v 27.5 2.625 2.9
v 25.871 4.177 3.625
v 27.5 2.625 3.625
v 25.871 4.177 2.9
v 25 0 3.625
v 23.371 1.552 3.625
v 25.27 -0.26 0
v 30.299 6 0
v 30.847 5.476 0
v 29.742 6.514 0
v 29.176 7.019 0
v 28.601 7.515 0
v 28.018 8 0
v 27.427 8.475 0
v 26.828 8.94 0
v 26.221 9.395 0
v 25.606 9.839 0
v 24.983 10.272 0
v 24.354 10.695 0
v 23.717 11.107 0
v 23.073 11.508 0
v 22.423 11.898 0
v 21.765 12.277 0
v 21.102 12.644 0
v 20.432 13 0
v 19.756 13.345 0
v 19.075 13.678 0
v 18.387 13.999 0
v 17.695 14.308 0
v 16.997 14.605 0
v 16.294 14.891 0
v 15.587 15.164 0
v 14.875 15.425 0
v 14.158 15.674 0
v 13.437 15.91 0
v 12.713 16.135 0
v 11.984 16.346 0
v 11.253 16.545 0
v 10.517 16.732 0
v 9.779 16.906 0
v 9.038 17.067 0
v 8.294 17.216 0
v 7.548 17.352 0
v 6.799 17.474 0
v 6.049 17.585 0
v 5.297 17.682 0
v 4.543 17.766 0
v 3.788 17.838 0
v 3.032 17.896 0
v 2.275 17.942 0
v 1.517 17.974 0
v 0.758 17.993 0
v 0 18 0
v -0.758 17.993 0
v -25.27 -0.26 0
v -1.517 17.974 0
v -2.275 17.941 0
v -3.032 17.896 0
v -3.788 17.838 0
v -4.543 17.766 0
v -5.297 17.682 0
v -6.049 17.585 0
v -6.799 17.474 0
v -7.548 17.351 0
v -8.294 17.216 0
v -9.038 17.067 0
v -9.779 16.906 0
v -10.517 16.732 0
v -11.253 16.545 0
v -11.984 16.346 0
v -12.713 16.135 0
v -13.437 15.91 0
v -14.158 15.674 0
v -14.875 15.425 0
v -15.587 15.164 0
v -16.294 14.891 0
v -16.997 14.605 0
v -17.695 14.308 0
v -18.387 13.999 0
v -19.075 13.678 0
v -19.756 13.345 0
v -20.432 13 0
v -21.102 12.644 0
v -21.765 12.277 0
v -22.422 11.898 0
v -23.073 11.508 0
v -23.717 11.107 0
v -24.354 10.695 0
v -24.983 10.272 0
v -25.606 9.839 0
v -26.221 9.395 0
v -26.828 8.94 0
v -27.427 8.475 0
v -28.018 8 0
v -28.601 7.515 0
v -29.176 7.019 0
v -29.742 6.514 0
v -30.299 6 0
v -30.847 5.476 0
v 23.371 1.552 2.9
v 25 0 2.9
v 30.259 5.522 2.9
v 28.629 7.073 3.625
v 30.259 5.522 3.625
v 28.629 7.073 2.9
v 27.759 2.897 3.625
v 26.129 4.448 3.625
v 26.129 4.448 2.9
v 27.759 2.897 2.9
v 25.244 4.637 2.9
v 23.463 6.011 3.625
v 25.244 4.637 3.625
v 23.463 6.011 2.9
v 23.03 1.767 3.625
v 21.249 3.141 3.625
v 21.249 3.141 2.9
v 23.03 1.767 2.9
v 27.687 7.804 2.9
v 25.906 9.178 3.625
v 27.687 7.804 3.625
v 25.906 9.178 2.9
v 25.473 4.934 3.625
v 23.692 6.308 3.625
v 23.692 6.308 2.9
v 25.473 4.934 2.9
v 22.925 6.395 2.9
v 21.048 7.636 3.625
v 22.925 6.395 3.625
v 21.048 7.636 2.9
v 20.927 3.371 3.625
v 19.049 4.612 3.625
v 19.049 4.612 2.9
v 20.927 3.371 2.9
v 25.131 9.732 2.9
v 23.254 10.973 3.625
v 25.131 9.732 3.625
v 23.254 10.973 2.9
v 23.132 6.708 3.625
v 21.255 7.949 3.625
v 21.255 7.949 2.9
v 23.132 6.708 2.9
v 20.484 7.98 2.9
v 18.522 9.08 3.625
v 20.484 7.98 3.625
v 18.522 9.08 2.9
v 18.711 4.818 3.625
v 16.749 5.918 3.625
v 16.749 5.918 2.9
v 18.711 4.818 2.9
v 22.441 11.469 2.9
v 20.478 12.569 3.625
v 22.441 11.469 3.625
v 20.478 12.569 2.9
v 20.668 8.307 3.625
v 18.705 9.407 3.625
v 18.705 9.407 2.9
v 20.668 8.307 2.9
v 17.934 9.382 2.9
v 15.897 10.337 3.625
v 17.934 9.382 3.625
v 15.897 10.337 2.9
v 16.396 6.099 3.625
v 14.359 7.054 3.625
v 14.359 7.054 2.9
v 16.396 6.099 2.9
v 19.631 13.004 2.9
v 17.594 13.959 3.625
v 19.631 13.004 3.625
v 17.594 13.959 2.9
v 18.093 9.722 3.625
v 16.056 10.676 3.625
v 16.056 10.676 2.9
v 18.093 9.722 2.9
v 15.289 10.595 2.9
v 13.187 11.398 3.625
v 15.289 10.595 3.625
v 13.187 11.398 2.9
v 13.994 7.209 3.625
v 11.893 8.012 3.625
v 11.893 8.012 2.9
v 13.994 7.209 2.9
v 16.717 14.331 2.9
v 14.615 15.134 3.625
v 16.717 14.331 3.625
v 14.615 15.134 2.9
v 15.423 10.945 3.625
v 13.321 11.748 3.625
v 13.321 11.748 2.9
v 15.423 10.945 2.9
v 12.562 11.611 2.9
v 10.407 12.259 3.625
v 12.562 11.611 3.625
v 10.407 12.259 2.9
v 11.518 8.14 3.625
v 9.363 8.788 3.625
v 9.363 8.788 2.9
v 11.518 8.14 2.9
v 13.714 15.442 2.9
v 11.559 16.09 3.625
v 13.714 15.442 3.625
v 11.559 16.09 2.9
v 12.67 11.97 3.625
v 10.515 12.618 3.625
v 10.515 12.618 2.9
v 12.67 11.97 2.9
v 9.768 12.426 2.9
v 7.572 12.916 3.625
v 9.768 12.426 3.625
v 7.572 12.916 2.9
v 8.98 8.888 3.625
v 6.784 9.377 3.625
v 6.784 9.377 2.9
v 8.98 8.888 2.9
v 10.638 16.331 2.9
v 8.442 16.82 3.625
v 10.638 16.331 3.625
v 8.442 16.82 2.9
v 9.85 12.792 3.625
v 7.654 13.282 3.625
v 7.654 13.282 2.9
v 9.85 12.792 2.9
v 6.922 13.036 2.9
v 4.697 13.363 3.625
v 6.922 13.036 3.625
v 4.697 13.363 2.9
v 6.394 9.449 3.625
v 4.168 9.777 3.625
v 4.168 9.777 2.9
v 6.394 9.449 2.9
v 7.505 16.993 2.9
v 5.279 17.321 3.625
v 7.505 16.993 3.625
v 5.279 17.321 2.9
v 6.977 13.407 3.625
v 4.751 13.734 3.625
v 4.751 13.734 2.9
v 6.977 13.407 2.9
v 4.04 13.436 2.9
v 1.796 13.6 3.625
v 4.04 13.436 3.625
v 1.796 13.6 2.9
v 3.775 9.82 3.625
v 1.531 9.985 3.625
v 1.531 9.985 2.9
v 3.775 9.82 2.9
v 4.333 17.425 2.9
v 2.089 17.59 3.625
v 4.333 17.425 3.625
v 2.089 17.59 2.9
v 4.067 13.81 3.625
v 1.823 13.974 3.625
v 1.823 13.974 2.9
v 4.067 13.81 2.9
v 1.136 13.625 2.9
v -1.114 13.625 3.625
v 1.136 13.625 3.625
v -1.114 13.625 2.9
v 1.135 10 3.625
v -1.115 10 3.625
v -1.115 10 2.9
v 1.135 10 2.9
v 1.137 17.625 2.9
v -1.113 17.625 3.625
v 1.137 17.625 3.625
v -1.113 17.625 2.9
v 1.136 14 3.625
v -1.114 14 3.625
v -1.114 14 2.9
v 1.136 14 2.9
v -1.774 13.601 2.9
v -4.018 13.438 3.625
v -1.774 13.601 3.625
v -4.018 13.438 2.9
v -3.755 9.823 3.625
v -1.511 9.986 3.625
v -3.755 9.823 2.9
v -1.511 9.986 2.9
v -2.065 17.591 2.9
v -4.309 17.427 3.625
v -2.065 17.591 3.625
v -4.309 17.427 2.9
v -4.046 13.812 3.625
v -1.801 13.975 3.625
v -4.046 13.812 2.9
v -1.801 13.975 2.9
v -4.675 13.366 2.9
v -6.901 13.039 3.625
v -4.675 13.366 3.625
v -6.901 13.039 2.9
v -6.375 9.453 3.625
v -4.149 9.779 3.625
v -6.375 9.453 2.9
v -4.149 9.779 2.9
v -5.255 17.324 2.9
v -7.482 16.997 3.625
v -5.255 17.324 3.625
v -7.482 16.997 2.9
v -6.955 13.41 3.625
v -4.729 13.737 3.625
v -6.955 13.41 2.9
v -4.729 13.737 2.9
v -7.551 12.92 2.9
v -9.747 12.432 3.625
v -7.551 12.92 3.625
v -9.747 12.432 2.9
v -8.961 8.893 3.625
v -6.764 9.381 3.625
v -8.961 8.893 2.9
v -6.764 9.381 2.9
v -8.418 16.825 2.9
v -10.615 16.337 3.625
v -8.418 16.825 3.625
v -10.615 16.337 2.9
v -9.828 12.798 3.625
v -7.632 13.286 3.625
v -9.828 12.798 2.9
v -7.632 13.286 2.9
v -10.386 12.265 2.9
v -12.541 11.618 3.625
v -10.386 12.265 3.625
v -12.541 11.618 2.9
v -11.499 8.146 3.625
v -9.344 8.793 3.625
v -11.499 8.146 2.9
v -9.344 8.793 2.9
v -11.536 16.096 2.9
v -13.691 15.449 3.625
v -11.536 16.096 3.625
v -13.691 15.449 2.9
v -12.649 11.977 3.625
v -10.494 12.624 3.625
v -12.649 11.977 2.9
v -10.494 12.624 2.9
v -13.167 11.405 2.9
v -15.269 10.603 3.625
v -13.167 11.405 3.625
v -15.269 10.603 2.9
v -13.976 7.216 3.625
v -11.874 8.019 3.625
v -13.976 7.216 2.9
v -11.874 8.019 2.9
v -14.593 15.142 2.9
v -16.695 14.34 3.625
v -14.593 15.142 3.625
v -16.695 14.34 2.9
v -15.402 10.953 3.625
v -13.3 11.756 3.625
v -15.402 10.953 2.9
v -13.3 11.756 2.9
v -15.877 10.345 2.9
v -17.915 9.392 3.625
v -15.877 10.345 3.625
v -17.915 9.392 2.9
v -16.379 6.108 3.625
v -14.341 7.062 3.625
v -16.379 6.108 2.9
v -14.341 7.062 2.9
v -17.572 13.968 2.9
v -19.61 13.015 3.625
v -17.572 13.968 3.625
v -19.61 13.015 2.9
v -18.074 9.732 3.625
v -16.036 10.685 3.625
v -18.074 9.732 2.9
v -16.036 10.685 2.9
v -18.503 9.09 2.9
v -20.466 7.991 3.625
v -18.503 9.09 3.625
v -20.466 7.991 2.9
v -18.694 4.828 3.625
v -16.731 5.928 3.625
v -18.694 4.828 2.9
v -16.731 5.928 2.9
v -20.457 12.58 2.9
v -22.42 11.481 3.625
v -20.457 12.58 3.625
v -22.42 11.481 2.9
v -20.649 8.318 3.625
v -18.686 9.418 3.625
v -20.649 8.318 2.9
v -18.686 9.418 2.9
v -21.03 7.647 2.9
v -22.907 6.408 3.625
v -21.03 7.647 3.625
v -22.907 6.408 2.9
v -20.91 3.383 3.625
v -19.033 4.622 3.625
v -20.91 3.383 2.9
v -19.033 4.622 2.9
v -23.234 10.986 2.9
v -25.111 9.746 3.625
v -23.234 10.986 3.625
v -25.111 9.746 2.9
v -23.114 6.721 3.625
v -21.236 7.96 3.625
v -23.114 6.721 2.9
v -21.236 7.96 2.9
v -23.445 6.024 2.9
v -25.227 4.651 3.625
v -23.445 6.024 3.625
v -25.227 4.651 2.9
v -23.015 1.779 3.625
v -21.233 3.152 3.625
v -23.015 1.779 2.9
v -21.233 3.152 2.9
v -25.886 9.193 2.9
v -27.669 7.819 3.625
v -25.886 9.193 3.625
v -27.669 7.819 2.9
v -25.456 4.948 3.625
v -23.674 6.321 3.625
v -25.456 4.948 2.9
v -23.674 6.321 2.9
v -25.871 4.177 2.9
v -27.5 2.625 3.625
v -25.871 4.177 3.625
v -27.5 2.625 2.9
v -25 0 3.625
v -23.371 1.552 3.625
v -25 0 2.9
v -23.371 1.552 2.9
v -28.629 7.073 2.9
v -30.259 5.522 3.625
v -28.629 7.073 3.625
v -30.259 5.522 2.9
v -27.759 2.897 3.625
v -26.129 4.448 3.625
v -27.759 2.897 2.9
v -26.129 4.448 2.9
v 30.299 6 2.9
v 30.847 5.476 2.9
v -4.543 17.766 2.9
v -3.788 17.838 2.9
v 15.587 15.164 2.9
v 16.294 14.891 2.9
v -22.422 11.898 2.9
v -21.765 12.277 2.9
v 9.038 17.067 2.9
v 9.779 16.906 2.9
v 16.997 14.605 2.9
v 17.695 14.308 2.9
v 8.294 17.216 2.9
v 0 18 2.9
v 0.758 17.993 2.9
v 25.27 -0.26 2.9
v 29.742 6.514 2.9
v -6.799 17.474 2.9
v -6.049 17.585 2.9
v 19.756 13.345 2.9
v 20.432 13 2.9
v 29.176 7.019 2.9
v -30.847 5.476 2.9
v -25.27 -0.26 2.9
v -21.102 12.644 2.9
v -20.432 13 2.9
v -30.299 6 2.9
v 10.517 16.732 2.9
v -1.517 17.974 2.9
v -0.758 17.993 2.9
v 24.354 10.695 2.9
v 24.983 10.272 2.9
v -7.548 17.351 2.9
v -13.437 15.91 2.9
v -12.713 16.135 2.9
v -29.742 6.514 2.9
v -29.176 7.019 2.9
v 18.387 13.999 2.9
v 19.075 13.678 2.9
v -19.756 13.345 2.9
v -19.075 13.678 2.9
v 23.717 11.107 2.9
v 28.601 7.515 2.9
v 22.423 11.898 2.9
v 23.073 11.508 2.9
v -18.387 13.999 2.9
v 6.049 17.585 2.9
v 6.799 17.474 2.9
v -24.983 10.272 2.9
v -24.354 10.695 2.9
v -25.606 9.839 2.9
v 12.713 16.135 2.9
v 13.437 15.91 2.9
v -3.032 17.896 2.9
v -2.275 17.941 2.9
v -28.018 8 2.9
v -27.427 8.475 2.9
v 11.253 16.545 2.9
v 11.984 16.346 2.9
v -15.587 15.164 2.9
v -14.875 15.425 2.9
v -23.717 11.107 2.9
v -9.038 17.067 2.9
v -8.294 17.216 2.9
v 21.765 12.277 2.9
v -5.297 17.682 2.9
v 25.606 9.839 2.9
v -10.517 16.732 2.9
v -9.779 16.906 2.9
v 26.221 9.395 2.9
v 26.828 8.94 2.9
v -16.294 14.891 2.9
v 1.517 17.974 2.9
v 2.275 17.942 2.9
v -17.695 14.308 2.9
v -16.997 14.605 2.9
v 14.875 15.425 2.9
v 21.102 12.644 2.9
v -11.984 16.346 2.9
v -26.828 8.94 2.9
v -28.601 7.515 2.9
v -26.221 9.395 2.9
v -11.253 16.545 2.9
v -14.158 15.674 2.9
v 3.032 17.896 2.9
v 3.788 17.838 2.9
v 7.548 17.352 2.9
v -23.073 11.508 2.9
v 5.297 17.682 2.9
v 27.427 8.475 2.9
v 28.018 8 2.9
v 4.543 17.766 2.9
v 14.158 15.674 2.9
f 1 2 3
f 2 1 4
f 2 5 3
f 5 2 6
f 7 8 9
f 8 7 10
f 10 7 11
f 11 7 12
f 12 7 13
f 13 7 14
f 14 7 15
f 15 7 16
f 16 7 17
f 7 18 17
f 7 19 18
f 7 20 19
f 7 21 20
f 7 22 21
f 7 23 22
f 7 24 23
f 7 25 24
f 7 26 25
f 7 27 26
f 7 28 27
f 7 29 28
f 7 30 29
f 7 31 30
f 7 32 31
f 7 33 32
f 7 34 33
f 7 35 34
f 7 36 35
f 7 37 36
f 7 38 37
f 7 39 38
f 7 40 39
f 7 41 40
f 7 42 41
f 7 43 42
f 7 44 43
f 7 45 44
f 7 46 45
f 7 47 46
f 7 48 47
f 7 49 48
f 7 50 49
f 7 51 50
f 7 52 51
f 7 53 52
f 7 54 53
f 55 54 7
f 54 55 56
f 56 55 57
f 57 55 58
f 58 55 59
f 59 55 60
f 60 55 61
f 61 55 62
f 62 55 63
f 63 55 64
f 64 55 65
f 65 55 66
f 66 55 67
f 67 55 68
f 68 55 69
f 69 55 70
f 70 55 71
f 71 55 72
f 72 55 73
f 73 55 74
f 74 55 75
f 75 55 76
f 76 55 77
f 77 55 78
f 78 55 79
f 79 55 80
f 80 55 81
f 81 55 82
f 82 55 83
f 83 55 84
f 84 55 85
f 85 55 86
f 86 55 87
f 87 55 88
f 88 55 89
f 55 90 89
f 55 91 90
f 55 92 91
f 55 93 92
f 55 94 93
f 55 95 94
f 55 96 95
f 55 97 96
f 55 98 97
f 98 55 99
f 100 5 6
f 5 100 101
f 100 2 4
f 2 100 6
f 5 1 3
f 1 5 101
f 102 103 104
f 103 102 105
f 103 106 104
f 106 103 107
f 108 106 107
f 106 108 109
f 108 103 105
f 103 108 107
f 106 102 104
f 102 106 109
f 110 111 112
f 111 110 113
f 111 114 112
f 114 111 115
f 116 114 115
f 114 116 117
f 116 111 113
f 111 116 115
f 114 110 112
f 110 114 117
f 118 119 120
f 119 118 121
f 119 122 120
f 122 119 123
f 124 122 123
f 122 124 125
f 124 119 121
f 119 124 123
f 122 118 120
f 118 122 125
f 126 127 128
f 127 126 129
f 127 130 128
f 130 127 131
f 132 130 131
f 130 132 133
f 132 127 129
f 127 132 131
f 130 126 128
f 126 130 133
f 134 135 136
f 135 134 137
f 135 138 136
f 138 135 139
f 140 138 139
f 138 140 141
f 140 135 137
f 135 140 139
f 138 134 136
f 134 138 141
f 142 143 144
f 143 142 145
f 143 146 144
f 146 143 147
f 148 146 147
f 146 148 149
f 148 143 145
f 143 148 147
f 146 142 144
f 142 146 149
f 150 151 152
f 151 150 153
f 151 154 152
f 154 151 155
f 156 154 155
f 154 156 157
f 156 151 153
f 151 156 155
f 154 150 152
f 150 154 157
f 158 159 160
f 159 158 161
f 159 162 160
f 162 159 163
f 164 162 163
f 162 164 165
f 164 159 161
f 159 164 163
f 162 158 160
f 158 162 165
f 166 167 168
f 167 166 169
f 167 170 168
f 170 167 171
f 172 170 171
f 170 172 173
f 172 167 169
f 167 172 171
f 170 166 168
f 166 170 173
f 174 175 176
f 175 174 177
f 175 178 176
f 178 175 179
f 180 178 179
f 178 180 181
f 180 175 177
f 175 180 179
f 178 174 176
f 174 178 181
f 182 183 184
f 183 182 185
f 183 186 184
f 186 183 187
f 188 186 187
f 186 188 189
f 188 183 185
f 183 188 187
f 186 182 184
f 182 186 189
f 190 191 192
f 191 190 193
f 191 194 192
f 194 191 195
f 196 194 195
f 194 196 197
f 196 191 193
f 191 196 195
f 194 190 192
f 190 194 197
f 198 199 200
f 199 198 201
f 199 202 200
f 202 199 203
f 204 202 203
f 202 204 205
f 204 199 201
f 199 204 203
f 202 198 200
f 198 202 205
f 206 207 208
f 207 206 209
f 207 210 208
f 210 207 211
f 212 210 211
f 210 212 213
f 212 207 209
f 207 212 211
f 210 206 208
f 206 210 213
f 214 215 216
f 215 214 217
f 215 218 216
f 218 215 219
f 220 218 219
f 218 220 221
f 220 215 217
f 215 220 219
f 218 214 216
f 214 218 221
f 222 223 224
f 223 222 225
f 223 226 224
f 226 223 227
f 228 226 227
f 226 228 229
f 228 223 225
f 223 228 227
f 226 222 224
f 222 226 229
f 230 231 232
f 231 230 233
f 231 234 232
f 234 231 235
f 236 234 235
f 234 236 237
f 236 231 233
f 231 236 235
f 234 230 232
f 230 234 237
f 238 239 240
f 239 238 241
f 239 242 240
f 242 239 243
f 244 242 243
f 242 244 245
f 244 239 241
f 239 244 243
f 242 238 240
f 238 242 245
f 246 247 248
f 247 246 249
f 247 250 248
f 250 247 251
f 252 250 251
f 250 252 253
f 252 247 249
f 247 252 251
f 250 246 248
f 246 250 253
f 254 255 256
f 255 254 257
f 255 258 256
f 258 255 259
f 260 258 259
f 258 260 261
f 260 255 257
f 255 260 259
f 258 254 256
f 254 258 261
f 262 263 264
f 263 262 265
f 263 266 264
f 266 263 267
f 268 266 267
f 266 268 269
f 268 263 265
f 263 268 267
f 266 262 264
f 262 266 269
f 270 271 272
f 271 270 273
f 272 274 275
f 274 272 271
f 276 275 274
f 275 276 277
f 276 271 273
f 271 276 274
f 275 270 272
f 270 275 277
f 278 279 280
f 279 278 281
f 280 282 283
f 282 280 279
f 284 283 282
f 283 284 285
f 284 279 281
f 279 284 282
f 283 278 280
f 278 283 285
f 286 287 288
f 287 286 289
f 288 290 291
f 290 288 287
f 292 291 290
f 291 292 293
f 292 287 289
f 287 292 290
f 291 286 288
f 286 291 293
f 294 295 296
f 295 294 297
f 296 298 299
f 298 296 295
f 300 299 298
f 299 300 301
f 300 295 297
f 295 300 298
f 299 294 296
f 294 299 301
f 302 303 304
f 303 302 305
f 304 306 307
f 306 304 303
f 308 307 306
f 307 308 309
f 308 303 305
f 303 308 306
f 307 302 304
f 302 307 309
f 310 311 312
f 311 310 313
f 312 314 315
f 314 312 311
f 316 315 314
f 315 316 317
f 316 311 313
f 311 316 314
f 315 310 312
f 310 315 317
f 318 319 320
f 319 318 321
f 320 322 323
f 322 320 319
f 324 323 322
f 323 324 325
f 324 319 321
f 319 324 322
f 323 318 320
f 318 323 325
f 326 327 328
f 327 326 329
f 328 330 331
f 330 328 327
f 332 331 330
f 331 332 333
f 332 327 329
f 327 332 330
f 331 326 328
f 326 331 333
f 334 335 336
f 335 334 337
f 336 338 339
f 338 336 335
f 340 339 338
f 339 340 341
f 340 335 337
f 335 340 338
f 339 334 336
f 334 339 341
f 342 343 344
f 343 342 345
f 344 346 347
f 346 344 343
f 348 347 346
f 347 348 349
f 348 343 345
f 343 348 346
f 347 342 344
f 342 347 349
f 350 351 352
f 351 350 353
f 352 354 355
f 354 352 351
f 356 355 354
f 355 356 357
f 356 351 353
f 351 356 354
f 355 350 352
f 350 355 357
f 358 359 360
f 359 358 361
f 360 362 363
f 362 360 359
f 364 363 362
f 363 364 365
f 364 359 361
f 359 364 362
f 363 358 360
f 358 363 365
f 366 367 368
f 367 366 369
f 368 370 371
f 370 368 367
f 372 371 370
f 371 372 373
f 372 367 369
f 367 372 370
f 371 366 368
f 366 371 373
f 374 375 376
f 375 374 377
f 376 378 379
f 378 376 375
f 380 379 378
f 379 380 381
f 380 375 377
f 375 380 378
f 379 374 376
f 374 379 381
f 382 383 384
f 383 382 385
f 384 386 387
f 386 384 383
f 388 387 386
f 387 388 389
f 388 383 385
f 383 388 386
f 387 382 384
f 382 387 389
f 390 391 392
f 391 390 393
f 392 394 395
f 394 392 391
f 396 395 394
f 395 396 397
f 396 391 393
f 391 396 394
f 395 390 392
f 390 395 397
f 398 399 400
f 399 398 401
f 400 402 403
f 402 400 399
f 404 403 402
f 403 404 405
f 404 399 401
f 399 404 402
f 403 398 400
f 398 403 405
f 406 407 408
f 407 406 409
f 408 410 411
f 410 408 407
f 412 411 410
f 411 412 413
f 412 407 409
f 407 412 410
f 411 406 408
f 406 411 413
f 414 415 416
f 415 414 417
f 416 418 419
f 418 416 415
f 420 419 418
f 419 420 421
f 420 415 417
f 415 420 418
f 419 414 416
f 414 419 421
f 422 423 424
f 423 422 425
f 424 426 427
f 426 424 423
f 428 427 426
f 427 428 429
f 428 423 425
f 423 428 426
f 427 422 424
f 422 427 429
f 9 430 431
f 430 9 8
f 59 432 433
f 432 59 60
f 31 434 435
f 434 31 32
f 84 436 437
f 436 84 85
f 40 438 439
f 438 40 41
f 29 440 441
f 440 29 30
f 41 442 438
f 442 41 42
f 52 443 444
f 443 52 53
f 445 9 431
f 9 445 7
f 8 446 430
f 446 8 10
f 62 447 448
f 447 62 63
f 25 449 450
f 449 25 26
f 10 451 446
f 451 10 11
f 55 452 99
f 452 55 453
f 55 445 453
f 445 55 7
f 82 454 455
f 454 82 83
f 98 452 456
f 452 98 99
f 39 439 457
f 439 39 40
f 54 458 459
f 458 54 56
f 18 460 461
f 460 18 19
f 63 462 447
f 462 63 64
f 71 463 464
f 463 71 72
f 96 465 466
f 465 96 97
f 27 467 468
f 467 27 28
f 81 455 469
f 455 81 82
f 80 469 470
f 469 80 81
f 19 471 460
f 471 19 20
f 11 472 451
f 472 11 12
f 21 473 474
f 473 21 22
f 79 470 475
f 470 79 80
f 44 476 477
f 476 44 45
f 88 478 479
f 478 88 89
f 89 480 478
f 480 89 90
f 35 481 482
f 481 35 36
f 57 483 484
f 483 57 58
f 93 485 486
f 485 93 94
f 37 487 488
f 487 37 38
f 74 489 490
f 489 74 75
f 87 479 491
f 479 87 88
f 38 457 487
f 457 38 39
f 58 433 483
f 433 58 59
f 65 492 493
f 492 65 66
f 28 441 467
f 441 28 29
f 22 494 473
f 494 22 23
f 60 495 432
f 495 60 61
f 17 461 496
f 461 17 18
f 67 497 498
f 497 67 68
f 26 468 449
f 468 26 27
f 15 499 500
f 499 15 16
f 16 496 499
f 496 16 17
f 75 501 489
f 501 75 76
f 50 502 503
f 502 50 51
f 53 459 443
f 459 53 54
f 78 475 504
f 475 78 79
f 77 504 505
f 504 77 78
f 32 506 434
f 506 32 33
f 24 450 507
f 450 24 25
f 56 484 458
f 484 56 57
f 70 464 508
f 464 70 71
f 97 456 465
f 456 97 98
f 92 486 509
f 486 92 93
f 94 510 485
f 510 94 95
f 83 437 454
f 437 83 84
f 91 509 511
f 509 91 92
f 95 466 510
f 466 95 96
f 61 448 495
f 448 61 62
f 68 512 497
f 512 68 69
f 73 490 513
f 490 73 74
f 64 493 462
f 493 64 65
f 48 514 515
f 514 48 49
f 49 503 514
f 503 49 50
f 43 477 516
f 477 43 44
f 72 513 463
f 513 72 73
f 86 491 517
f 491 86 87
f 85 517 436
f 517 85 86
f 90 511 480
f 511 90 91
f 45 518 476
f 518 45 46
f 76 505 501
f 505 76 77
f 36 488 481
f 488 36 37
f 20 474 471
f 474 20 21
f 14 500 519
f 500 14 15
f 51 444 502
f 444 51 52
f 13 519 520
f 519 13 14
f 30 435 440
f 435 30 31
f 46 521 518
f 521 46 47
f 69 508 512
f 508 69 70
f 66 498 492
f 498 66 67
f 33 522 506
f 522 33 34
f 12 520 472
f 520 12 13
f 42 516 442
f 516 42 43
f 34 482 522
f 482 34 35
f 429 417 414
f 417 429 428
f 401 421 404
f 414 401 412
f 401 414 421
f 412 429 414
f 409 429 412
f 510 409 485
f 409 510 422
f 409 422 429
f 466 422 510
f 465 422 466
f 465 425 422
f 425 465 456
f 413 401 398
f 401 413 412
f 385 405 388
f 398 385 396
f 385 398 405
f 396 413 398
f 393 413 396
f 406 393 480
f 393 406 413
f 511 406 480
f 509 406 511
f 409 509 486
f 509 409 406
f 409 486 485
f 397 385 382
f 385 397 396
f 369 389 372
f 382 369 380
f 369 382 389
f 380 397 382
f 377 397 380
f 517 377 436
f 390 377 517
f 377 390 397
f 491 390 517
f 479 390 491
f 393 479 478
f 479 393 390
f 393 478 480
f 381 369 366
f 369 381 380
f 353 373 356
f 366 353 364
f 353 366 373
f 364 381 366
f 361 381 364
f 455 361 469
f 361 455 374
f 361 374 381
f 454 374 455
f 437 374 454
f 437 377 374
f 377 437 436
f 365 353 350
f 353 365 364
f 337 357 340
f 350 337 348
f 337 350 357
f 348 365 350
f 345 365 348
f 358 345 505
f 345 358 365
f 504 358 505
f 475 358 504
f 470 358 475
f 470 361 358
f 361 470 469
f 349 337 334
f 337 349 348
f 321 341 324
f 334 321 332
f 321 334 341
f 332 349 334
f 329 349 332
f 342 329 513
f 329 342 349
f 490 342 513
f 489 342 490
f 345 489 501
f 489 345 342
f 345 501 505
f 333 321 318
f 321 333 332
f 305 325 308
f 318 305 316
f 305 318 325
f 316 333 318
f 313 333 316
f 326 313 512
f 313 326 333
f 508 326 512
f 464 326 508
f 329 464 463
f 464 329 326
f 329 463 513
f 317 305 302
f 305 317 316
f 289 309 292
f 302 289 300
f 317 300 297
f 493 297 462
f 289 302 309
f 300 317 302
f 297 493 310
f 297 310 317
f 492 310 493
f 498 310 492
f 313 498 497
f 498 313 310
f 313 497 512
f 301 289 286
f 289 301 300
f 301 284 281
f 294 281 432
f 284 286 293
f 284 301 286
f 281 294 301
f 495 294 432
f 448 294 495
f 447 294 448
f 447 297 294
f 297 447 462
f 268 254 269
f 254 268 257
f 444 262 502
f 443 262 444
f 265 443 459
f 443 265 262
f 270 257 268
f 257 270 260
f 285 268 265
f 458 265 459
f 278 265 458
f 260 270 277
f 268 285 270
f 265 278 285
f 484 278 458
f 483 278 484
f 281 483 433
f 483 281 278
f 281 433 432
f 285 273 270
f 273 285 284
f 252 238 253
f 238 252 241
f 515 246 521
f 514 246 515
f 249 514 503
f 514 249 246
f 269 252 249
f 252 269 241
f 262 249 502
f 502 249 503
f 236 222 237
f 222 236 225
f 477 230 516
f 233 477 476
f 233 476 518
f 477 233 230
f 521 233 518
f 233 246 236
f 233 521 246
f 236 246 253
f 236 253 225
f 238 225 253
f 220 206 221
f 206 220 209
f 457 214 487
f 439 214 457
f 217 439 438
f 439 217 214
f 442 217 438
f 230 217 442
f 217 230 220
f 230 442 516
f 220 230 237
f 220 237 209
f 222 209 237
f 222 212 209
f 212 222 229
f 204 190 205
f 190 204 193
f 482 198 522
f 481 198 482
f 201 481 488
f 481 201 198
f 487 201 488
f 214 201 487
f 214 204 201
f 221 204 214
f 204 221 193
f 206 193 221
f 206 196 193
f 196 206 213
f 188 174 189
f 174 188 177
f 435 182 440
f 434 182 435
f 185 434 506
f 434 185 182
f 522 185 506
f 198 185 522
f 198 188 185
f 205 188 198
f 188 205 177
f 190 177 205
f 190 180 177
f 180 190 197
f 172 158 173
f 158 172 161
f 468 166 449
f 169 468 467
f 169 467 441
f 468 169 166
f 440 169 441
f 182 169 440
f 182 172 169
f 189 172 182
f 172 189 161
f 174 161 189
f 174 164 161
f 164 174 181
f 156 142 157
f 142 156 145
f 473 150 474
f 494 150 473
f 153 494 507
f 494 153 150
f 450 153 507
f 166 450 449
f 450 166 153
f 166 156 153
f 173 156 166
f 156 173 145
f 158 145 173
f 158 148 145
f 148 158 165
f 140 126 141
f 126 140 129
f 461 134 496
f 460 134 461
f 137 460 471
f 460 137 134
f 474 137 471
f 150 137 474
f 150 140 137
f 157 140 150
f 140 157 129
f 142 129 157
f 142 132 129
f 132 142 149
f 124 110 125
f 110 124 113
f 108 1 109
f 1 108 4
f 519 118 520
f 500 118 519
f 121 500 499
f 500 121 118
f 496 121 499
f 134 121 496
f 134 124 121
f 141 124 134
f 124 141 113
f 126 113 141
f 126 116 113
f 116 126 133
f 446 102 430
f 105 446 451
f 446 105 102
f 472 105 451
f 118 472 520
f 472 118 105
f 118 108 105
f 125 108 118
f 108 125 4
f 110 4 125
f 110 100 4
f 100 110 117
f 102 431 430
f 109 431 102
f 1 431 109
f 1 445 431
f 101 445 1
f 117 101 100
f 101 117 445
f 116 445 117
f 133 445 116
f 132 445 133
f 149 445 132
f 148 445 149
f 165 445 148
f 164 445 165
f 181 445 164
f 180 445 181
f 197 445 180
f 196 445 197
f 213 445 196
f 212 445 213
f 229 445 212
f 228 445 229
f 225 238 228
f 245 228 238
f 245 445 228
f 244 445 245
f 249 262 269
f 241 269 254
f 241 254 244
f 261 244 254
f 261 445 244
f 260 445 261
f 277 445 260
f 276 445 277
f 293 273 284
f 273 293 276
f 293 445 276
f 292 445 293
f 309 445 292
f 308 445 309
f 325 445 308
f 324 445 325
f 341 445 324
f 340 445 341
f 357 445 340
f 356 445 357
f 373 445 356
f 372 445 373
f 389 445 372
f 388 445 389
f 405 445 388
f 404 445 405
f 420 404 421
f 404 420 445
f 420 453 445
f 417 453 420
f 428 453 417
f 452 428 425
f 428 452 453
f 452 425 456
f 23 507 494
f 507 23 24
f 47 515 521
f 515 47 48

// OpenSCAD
// file: brickstyles.scad
bricksizes = [  //tuples are brickwidth, brickheight, brickthickness, mortarwidth
	[7.625,	2.25, 3.625, 0.375],		//0: modular, 3/8" mortar
	[7.5, 2.25, 3.5, 0.5]			//1: modular, 1/2" mortar
];

//brickstyles, reference rows in bricksizes
modular_3_8 = 0;	//modular, 3/8" mortar
modular_1_2 = 1;	//modular, 1/2" mortar

//arch patterns:
bpsimple = 0;		//single full-width brick
bpdoubleheader = 1;	//two header bricks
bpornate = 2;		//alternating full-width and two-header bricks
// main file
include <brickstyles.scad>


//dimension of the arch span
//span=96;
span=50;
//dimension of the arch's inner radius
rise=10;
//width of each brick, 
brickwidth=8;
//height of brick, edge on the radius
brickheight=3;
//depth of brick, edge on the radius
brickdepth=3;
//mortarwidth between bricks, edge on the radius
mortarwidth=1;


//Useful functions

//arcpoly produces a arc polygon dimensioned by the inner and outerradius and the angle.  
//polygons are started at 0 degrees, along the X axis out at the inner radius.  Up to 
//the user to rotate/translate them to suit.
function arcpoly( innerradius, outerradius, angle, segments) = 
	[	for (i = [0:angle/segments:angle]) [outerradius * cos(i), outerradius * sin(i) ],
		for (i = [angle:-angle/segments:0]) [innerradius * cos(i), innerradius * sin(i) ]
	];

function arc_halfpoly( innerradius, outerradius, angle, segments) = 
	[	for (i = [0:angle/segments:angle]) [outerradius * cos(i), outerradius * sin(i) ],
		[innerradius * cos(angle), innerradius * sin(angle) ],
		[innerradius * cos(0), innerradius * sin(0) ]
	];
		

//arcangle tells the angle of an arc from a circle, where the arc is defined by the chord, 
//which is the straignt line between the two endpoints of the arc.
function arcangle(chord, radius) = 2*asin(chord/(2*radius));

//arcradius tells the radius from the center-to-edge of a circle that contains a particular
//arc.  The arc is defined by its chord and saggital; the latter is the measure between the
//chord and the circle at the center of the chord.
//There's more than one way to skin a saggital, uncomment the one you like.  They both 
//yield the same answer, based on my limited testing:
//function arcradius(chord, sagittal) = ((sagittal*sagittal)+((chord/2)*(chord/2))) / (2*sagittal);
function arcradius(chord, sagittal) = (sagittal/2) + (chord*chord)/(8*sagittal);


//Brick pattern modules


module brick_pattern(brickstyle=0, pattern=0, sequence=0, reverse=0) {
	brickwidth=bricksizes[brickstyle][0];
	brickheight=bricksizes[brickstyle][1];
	brickdepth=bricksizes[brickstyle][2];
	mortarwidth=bricksizes[brickstyle][3];
	
	if (pattern == bpsimple) {
		cube([brickwidth, brickheight, brickdepth]);
	}
	else if (pattern == bpdoubleheader) {
		cube([brickdepth, brickheight, brickdepth]);
		translate([brickdepth+mortarwidth,0,0]) cube([brickdepth, brickheight, brickdepth]);
	}
	else if (pattern == bpornate) {
		if (reverse) {
			if (sequence % 2 == 0) {
				cube([brickwidth, brickheight, brickdepth]);
			}
			else {
				cube([brickdepth, brickheight, brickdepth]);
				translate([brickdepth+mortarwidth,0,0]) cube([brickdepth, brickheight, brickdepth]);
			}
		}
		else {
			if (sequence % 2 == 0) {
				cube([brickdepth, brickheight, brickdepth]);
				translate([brickdepth+mortarwidth,0,0]) cube([brickdepth, brickheight, brickdepth]);
			}
			else {
				cube([brickwidth, brickheight, brickdepth]);
			}
		}
	}
}


//Arch modules

//All arch modules render their object with the lower left corner of the arch anchored
//on the origin, to facilitate easy integration of them into a wall with a minimum of 
//(hopefully, no) "scooching".


//arch_brick: make a brick arch with the specfied span and rise, and put its 
//lower-left-hand corner on the origin for easy locating on a brick wall rendered 
//with other code.  Maximum rise should be less than or equal to span/2, which will 
//render a 180-degree arch.  This module makes straight bricks.
//module arch_brick(span, rise, brickwidth, brickheight, brickdepth, mortarwidth) {
module arch_brick(span, rise, brickstyle, pattern, reverse) {
	brickwidth=bricksizes[brickstyle][0];
	brickheight=bricksizes[brickstyle][1];
	brickdepth=bricksizes[brickstyle][2];
	mortarwidth=bricksizes[brickstyle][3];

	radius = arcradius(span, rise);
	sweepangle = arcangle(span, radius);
	brickangle = arcangle(brickheight, radius);
	mortarangle = arcangle(mortarwidth, radius);

	totalbricks = floor(sweepangle / (brickangle+mortarangle));
	totalbrickangle = brickangle * totalbricks;
	totalmortarangle = mortarangle * (totalbricks-1);
	residualmortar = sweepangle - (totalbrickangle+totalmortarangle);
	realmortarangle = mortarangle+(residualmortar/totalbricks);
				
	//positions the arch with the bottom touching the X axis, centered on the Y axis.  Facilitates
	//psitioning the arch referenced to the window center
	rotate([0,0,90])
		translate([-radius+rise,0,0])
			rotate([0,0,-sweepangle/2])
				
	{
		//right-hand anchor
		translate([radius,0,0]) 	//translate out to the radius
		brick_pattern(brickstyle=brickstyle, pattern=pattern, reverse=reverse);

		//right-hand segment
		for (i = [1:1:(totalbricks-2)]) 
			rotate([0,0,(brickangle+realmortarangle)*i+brickangle/2]) 	//rotate out to the position
				translate([radius,-brickheight/2,0]) 					//translate out to the radius
					brick_pattern(brickstyle=brickstyle, pattern=pattern, sequence=i, reverse=reverse);

		//left-hand anchor
		rotate([0,0,sweepangle])					//put it on the other end of the arch
			translate([radius,-brickheight,0]) 		//translate out to the radius
				brick_pattern(brickstyle=brickstyle, pattern=pattern, reverse=reverse);
	}
}

//arch_brick_tapered: make a brick arch with the specfied span and rise, and center 
//the arch on the Y axis, resting on the X axis, for easy locating on a brick wall rendered 
//with other code.  Maximum rise should be less than or equal to span/2, which will 
//render a 180-degree arch.  This module makes tapered bricks.
module arch_brick_tapered(span, rise, brickstyle) {
	brickwidth=bricksizes[brickstyle][0];
	brickheight=bricksizes[brickstyle][1];
	brickdepth=bricksizes[brickstyle][2];
	mortarwidth=bricksizes[brickstyle][3];

	radius = arcradius(span, rise);
	sweepangle = arcangle(span, radius);
	brickangle = arcangle(brickheight, radius);
	mortarangle = arcangle(mortarwidth, radius);
	
	totalbricks = floor(sweepangle / (brickangle+mortarangle));
	totalbrickangle = brickangle * totalbricks;
	totalmortarangle = mortarangle * (totalbricks-1);
	residualmortar = sweepangle - (totalbrickangle+totalmortarangle);
	mortarinterval = sweepangle / totalbricks;
	
	echo("totalbricks", totalbricks);
				
	//positions the arch with the bottom touching the X axis, centered on the Y axis.  Facilitates
	//positioning the arch referenced to the window center
	rotate([0,0,90])
		translate([-radius+rise,0,0])
			rotate([0,0,-sweepangle/2])
	{
		poly = arcpoly(radius, radius+brickwidth, sweepangle, 40);
		difference() {
			linear_extrude(brickdepth) polygon(poly);
			for (i = [mortarinterval:mortarinterval:sweepangle])
				rotate([0,0,i])
					translate([0,0,-brickdepth/2])
						cube([radius*2,mortarwidth,brickdepth*2]);
		}

	}
}

//arch_polygon: makes an arc polygon, used for defining difference() cutters 
//and mortar slabs.  extenddegrees adds that number to the ends of the arc.
module arch_polygon(span, rise, width, depth, extenddegrees) {
	radius = arcradius(span, rise);
	sweepangle = arcangle(span, radius);
	poly = arcpoly(radius, radius+width, sweepangle+extenddegrees*2, 90);
				
	//positions the arch with the bottom touching the X axis, centered on the Y axis.  Facilitates
	//positioning the arch referenced to the window center
	rotate([0,0,90])
		translate([-radius+rise,0,0])
			rotate([0,0,-sweepangle/2-extenddegrees])
					linear_extrude(depth) polygon(poly);
}

//arch_halfround: makes a half-circle, used for defining difference() cutters
module arch_halfround(span, depth, segments=90) {
		linear_extrude(depth) 
			polygon(arcpoly(0, span/2, 180, segments));
}

module arch_cutter(span, rise, brickstyle, depthscale) {
	brickwidth=bricksizes[brickstyle][0];
	brickheight=bricksizes[brickstyle][1];
	brickdepth=bricksizes[brickstyle][2];
	mortarwidth=bricksizes[brickstyle][3];
	
	width = brickwidth+mortarwidth*1;
	depth=brickdepth*depthscale;

	radius = arcradius(span, rise);
	sweepangle = arcangle(span, radius);
	mortarangle = arcangle(mortarwidth, radius);
	poly = arc_halfpoly(radius, radius+width, sweepangle+mortarangle*2, 90);
				
	//positions the arch with the bottom touching the X axis, centered on the Y axis.  Facilitates
	//positioning the arch referenced to the window center
	rotate([0,0,90])
		translate([-radius+rise,0,0])
			rotate([0,0,-sweepangle/2-mortarangle])
					linear_extrude(depth) polygon(poly);
}


//Test routines

//scale(25/4)
//scale(1/87) {

color("red")
	arch_brick(span=span, rise=rise, brickstyle=0, pattern=bpdoubleheader, reverse=1);
color("white") 
	arch_cutter(span=span, rise=rise, brickstyle=0, depthscale=0.8);


	//color("red") 
//	arch_brick_tapered(span=span, rise=rise, brickstyle=0);
//color("white") 
//	arch_polygon(span=span, rise=rise, width=brickwidth+mortarwidth*4, depth=brickheight*0.8, 2);

//arch_brick_tapered(span=span, rise=rise, brickwidth=brickwidth, brickheight=brickheight, brickdepth=brickdepth, mortarwidth=mortarwidth);
//arch_halfround(span=span, depth=10);

//} //scales
